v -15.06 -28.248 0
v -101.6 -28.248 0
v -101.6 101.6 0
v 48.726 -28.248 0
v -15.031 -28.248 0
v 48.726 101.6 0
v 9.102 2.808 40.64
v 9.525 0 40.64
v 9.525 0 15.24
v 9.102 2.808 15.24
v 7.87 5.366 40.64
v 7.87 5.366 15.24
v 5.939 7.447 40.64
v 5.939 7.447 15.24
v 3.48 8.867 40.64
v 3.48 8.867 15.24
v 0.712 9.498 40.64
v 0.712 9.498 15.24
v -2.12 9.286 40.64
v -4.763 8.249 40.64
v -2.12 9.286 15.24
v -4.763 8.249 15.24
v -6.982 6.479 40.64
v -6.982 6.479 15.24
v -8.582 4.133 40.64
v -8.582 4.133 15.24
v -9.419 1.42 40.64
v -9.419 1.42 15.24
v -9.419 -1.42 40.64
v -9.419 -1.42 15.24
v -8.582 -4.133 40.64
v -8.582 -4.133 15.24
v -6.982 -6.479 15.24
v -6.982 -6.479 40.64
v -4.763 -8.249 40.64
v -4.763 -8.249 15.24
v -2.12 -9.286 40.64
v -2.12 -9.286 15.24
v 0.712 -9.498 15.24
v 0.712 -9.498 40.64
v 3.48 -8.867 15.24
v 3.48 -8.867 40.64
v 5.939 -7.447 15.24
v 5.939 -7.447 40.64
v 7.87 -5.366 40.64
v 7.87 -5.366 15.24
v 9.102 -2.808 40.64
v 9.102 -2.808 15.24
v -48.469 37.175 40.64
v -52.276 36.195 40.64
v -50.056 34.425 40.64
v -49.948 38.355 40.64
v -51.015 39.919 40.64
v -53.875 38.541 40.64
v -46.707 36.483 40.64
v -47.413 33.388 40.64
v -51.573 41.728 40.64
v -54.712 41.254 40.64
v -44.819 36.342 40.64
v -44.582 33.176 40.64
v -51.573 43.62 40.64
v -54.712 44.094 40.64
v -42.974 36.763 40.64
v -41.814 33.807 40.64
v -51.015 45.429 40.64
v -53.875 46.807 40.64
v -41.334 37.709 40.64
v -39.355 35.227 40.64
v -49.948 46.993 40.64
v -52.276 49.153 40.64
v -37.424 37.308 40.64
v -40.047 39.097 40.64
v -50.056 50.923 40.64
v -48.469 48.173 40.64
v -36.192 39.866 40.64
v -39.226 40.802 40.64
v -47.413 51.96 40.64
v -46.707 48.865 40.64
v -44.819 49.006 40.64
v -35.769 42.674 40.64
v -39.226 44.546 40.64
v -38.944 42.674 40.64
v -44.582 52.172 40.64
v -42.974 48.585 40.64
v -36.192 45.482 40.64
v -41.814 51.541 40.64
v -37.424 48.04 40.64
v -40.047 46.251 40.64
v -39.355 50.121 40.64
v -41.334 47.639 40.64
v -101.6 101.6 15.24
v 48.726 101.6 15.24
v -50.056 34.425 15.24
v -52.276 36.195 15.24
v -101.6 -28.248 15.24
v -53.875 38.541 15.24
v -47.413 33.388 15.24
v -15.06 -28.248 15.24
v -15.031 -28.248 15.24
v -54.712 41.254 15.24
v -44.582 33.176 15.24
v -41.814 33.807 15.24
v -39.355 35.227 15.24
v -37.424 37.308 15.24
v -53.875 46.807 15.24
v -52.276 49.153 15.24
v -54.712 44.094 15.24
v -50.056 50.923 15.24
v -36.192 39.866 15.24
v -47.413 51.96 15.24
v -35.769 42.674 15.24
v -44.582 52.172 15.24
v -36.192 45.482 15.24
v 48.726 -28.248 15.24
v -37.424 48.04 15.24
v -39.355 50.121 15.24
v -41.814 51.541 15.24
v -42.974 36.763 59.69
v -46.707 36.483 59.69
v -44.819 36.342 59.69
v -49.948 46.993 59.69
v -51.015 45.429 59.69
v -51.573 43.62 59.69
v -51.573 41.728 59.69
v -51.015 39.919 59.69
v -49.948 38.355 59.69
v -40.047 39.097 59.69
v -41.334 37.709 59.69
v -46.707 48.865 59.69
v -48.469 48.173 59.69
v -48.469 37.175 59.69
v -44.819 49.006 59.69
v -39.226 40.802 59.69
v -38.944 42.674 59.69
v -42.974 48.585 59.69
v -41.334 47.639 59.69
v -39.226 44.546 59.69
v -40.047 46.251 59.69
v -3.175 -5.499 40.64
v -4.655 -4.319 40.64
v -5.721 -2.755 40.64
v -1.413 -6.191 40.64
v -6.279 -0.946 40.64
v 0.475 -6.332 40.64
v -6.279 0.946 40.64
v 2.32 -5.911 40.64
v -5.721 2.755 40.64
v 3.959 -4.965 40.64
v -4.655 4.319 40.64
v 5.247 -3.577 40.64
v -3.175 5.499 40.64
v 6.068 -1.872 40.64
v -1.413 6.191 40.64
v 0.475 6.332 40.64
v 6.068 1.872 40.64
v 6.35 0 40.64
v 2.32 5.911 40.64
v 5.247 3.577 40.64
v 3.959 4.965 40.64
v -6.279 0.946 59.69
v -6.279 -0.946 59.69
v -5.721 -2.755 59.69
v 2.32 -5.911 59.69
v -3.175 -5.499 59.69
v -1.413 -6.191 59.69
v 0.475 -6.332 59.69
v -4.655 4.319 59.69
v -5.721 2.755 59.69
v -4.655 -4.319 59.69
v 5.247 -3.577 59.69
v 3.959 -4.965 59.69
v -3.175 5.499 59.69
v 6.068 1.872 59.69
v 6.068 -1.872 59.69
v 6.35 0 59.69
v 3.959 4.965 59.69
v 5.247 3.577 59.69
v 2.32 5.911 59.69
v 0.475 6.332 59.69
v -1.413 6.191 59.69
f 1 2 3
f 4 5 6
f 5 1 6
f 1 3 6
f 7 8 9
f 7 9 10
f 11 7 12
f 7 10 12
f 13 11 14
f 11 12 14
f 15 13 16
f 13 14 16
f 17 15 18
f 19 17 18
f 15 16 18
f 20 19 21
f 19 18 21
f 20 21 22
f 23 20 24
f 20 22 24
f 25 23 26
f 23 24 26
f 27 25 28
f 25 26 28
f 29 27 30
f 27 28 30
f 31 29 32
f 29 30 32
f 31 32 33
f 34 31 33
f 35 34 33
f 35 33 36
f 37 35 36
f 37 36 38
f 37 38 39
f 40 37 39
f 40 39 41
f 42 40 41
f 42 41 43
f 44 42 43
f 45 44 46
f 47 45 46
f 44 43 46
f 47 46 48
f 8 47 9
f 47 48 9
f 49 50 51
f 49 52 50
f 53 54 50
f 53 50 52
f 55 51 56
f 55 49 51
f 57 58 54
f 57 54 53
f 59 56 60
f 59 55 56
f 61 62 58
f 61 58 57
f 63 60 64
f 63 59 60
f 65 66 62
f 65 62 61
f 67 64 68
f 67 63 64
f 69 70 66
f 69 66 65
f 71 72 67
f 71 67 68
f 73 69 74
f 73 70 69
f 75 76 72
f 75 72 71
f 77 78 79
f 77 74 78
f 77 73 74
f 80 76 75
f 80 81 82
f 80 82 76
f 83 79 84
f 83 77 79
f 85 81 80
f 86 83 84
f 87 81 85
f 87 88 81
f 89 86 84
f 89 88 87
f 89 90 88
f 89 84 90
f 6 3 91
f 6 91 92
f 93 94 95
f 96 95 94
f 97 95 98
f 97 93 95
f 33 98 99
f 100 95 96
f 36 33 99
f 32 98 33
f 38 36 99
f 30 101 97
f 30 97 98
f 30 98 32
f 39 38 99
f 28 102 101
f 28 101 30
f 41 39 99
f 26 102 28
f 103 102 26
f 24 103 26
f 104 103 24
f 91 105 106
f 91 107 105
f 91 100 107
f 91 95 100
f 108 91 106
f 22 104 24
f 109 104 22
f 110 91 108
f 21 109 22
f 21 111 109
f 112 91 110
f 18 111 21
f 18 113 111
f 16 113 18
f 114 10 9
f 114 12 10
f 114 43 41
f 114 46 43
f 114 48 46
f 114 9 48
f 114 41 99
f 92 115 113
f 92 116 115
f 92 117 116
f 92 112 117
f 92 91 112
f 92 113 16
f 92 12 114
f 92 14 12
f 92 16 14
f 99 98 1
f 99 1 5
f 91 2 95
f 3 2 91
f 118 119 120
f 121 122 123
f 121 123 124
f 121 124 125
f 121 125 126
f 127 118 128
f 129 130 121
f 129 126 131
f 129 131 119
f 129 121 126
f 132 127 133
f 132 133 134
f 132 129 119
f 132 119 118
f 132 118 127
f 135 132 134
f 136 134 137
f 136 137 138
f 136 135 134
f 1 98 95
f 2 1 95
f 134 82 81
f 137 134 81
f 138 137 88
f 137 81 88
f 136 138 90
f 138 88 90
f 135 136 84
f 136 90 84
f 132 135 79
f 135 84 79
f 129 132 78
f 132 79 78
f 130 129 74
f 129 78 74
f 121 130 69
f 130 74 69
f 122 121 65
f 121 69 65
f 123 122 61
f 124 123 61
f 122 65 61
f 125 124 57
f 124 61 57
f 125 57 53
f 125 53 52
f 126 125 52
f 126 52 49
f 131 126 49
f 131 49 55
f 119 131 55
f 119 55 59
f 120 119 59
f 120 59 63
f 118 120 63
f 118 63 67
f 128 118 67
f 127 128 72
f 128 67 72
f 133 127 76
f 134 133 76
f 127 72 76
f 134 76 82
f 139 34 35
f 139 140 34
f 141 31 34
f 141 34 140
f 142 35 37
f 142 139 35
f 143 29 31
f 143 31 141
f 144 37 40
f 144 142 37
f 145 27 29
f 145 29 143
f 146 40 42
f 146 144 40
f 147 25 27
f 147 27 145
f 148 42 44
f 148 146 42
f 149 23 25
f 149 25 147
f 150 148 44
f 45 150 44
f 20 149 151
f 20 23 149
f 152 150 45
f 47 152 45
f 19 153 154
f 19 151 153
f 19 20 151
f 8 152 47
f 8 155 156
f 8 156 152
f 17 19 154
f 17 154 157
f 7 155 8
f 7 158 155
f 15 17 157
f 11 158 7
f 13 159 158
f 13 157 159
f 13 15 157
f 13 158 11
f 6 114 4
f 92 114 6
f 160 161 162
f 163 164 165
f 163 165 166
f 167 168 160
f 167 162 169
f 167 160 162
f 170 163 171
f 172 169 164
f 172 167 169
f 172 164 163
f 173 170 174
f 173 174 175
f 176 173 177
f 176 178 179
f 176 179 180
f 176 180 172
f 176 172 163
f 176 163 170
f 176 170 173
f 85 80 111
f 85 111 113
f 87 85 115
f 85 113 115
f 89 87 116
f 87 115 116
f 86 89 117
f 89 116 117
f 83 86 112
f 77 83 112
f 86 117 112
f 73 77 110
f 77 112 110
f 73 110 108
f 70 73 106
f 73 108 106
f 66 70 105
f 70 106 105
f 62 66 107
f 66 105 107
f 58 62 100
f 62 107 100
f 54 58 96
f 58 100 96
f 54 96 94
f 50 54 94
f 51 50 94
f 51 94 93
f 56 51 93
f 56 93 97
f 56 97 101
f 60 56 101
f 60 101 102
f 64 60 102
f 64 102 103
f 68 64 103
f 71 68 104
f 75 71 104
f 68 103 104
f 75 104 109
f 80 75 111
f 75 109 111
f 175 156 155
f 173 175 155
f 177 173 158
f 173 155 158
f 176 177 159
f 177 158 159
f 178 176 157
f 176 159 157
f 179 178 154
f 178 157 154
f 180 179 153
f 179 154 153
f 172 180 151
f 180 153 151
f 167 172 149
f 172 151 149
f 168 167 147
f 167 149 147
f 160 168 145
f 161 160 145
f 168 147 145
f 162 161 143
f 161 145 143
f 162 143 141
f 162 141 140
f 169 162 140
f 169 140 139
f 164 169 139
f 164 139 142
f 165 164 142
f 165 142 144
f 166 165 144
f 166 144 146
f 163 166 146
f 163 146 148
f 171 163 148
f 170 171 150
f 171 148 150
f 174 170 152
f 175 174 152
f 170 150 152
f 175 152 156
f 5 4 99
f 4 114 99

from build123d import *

# Parameters (mm, degrees)
F0_W      = 203.2
F0_H      = 203.2
F1_DEPTH  = 15.24
F2_R      = 9.525
F3_DEPTH  = 25.4
F4_R      = 6.35
F5_DEPTH  = 19.05
F6_R      = 9.525
F7_DEPTH  = 25.4
F8_R      = 6.35
F9_DEPTH  = 19.05
F10_W     = 66.012211
F10_H     = 227.670602
F11_DEPTH = 81.788
F12_W     = 0.028826
F12_H     = 5.976447
F13_DEPTH = 59.182


with BuildPart() as f1:
    # F0 (on Top) → F1 (new body)
    with BuildSketch(Plane.XY):
        Rectangle(F0_W, F0_H)
    extrude(amount=F1_DEPTH)

    # F2 (on face) → F3 (join)
    with BuildSketch(Plane.XY.offset(15.24)):
        Circle(F2_R)
        with Locations((62.23, 0)):
            Circle(F2_R)
        with Locations((-45.293553, 42.673961)):
            Circle(F2_R)
        with Locations((62.23, -62.23)):
            Circle(F2_R)
    extrude(amount=F3_DEPTH)

    # F4 (on face) → F5 (join)
    with BuildSketch(Plane.XY.offset(40.64)):
        with Locations((-45.293553, 42.673961)):
            Circle(F4_R)
        Circle(F4_R)
        with Locations((62.23, -62.23)):
            Circle(F4_R)
        with Locations((62.23, 0)):
            Circle(F4_R)
    extrude(amount=F5_DEPTH)

    # F6 (on face) → F7 (join)
    with BuildSketch(Plane.XY.offset(15.24)):
        with Locations((-42.088444, -45.838148)):
            Circle(F6_R)
    extrude(amount=F7_DEPTH)

    # F8 (on face) → F9 (join)
    with BuildSketch(Plane.XY.offset(40.64)):
        with Locations((-42.088444, -45.838148)):
            Circle(F8_R)
    extrude(amount=F9_DEPTH)

    # F10 (on face) → F11 (cut)
    with BuildSketch(Plane.XY.offset(59.69)):
        with Locations((81.731911, -7.860381)):
            Rectangle(F10_W, F10_H)
    extrude(amount=-F11_DEPTH, mode=Mode.SUBTRACT)

    # F12 (on face) → F13 (cut, symmetric)
    with BuildSketch(Plane.XY.offset(15.24)):
        Polygon((-15.059947, -28.248059), (-113.846987, -28.248059), (-113.846987, -116.091147), (57.950988, -116.091147), (57.950988, -28.248059), (-15.031121, -28.248059), (-15.031121, -34.224506), (-15.059947, -34.224506), align=None)
        with Locations((-15.045534, -31.236282)):
            Rectangle(F12_W, F12_H)
    extrude(amount=F13_DEPTH, both=True, mode=Mode.SUBTRACT)


solid = f1.part
